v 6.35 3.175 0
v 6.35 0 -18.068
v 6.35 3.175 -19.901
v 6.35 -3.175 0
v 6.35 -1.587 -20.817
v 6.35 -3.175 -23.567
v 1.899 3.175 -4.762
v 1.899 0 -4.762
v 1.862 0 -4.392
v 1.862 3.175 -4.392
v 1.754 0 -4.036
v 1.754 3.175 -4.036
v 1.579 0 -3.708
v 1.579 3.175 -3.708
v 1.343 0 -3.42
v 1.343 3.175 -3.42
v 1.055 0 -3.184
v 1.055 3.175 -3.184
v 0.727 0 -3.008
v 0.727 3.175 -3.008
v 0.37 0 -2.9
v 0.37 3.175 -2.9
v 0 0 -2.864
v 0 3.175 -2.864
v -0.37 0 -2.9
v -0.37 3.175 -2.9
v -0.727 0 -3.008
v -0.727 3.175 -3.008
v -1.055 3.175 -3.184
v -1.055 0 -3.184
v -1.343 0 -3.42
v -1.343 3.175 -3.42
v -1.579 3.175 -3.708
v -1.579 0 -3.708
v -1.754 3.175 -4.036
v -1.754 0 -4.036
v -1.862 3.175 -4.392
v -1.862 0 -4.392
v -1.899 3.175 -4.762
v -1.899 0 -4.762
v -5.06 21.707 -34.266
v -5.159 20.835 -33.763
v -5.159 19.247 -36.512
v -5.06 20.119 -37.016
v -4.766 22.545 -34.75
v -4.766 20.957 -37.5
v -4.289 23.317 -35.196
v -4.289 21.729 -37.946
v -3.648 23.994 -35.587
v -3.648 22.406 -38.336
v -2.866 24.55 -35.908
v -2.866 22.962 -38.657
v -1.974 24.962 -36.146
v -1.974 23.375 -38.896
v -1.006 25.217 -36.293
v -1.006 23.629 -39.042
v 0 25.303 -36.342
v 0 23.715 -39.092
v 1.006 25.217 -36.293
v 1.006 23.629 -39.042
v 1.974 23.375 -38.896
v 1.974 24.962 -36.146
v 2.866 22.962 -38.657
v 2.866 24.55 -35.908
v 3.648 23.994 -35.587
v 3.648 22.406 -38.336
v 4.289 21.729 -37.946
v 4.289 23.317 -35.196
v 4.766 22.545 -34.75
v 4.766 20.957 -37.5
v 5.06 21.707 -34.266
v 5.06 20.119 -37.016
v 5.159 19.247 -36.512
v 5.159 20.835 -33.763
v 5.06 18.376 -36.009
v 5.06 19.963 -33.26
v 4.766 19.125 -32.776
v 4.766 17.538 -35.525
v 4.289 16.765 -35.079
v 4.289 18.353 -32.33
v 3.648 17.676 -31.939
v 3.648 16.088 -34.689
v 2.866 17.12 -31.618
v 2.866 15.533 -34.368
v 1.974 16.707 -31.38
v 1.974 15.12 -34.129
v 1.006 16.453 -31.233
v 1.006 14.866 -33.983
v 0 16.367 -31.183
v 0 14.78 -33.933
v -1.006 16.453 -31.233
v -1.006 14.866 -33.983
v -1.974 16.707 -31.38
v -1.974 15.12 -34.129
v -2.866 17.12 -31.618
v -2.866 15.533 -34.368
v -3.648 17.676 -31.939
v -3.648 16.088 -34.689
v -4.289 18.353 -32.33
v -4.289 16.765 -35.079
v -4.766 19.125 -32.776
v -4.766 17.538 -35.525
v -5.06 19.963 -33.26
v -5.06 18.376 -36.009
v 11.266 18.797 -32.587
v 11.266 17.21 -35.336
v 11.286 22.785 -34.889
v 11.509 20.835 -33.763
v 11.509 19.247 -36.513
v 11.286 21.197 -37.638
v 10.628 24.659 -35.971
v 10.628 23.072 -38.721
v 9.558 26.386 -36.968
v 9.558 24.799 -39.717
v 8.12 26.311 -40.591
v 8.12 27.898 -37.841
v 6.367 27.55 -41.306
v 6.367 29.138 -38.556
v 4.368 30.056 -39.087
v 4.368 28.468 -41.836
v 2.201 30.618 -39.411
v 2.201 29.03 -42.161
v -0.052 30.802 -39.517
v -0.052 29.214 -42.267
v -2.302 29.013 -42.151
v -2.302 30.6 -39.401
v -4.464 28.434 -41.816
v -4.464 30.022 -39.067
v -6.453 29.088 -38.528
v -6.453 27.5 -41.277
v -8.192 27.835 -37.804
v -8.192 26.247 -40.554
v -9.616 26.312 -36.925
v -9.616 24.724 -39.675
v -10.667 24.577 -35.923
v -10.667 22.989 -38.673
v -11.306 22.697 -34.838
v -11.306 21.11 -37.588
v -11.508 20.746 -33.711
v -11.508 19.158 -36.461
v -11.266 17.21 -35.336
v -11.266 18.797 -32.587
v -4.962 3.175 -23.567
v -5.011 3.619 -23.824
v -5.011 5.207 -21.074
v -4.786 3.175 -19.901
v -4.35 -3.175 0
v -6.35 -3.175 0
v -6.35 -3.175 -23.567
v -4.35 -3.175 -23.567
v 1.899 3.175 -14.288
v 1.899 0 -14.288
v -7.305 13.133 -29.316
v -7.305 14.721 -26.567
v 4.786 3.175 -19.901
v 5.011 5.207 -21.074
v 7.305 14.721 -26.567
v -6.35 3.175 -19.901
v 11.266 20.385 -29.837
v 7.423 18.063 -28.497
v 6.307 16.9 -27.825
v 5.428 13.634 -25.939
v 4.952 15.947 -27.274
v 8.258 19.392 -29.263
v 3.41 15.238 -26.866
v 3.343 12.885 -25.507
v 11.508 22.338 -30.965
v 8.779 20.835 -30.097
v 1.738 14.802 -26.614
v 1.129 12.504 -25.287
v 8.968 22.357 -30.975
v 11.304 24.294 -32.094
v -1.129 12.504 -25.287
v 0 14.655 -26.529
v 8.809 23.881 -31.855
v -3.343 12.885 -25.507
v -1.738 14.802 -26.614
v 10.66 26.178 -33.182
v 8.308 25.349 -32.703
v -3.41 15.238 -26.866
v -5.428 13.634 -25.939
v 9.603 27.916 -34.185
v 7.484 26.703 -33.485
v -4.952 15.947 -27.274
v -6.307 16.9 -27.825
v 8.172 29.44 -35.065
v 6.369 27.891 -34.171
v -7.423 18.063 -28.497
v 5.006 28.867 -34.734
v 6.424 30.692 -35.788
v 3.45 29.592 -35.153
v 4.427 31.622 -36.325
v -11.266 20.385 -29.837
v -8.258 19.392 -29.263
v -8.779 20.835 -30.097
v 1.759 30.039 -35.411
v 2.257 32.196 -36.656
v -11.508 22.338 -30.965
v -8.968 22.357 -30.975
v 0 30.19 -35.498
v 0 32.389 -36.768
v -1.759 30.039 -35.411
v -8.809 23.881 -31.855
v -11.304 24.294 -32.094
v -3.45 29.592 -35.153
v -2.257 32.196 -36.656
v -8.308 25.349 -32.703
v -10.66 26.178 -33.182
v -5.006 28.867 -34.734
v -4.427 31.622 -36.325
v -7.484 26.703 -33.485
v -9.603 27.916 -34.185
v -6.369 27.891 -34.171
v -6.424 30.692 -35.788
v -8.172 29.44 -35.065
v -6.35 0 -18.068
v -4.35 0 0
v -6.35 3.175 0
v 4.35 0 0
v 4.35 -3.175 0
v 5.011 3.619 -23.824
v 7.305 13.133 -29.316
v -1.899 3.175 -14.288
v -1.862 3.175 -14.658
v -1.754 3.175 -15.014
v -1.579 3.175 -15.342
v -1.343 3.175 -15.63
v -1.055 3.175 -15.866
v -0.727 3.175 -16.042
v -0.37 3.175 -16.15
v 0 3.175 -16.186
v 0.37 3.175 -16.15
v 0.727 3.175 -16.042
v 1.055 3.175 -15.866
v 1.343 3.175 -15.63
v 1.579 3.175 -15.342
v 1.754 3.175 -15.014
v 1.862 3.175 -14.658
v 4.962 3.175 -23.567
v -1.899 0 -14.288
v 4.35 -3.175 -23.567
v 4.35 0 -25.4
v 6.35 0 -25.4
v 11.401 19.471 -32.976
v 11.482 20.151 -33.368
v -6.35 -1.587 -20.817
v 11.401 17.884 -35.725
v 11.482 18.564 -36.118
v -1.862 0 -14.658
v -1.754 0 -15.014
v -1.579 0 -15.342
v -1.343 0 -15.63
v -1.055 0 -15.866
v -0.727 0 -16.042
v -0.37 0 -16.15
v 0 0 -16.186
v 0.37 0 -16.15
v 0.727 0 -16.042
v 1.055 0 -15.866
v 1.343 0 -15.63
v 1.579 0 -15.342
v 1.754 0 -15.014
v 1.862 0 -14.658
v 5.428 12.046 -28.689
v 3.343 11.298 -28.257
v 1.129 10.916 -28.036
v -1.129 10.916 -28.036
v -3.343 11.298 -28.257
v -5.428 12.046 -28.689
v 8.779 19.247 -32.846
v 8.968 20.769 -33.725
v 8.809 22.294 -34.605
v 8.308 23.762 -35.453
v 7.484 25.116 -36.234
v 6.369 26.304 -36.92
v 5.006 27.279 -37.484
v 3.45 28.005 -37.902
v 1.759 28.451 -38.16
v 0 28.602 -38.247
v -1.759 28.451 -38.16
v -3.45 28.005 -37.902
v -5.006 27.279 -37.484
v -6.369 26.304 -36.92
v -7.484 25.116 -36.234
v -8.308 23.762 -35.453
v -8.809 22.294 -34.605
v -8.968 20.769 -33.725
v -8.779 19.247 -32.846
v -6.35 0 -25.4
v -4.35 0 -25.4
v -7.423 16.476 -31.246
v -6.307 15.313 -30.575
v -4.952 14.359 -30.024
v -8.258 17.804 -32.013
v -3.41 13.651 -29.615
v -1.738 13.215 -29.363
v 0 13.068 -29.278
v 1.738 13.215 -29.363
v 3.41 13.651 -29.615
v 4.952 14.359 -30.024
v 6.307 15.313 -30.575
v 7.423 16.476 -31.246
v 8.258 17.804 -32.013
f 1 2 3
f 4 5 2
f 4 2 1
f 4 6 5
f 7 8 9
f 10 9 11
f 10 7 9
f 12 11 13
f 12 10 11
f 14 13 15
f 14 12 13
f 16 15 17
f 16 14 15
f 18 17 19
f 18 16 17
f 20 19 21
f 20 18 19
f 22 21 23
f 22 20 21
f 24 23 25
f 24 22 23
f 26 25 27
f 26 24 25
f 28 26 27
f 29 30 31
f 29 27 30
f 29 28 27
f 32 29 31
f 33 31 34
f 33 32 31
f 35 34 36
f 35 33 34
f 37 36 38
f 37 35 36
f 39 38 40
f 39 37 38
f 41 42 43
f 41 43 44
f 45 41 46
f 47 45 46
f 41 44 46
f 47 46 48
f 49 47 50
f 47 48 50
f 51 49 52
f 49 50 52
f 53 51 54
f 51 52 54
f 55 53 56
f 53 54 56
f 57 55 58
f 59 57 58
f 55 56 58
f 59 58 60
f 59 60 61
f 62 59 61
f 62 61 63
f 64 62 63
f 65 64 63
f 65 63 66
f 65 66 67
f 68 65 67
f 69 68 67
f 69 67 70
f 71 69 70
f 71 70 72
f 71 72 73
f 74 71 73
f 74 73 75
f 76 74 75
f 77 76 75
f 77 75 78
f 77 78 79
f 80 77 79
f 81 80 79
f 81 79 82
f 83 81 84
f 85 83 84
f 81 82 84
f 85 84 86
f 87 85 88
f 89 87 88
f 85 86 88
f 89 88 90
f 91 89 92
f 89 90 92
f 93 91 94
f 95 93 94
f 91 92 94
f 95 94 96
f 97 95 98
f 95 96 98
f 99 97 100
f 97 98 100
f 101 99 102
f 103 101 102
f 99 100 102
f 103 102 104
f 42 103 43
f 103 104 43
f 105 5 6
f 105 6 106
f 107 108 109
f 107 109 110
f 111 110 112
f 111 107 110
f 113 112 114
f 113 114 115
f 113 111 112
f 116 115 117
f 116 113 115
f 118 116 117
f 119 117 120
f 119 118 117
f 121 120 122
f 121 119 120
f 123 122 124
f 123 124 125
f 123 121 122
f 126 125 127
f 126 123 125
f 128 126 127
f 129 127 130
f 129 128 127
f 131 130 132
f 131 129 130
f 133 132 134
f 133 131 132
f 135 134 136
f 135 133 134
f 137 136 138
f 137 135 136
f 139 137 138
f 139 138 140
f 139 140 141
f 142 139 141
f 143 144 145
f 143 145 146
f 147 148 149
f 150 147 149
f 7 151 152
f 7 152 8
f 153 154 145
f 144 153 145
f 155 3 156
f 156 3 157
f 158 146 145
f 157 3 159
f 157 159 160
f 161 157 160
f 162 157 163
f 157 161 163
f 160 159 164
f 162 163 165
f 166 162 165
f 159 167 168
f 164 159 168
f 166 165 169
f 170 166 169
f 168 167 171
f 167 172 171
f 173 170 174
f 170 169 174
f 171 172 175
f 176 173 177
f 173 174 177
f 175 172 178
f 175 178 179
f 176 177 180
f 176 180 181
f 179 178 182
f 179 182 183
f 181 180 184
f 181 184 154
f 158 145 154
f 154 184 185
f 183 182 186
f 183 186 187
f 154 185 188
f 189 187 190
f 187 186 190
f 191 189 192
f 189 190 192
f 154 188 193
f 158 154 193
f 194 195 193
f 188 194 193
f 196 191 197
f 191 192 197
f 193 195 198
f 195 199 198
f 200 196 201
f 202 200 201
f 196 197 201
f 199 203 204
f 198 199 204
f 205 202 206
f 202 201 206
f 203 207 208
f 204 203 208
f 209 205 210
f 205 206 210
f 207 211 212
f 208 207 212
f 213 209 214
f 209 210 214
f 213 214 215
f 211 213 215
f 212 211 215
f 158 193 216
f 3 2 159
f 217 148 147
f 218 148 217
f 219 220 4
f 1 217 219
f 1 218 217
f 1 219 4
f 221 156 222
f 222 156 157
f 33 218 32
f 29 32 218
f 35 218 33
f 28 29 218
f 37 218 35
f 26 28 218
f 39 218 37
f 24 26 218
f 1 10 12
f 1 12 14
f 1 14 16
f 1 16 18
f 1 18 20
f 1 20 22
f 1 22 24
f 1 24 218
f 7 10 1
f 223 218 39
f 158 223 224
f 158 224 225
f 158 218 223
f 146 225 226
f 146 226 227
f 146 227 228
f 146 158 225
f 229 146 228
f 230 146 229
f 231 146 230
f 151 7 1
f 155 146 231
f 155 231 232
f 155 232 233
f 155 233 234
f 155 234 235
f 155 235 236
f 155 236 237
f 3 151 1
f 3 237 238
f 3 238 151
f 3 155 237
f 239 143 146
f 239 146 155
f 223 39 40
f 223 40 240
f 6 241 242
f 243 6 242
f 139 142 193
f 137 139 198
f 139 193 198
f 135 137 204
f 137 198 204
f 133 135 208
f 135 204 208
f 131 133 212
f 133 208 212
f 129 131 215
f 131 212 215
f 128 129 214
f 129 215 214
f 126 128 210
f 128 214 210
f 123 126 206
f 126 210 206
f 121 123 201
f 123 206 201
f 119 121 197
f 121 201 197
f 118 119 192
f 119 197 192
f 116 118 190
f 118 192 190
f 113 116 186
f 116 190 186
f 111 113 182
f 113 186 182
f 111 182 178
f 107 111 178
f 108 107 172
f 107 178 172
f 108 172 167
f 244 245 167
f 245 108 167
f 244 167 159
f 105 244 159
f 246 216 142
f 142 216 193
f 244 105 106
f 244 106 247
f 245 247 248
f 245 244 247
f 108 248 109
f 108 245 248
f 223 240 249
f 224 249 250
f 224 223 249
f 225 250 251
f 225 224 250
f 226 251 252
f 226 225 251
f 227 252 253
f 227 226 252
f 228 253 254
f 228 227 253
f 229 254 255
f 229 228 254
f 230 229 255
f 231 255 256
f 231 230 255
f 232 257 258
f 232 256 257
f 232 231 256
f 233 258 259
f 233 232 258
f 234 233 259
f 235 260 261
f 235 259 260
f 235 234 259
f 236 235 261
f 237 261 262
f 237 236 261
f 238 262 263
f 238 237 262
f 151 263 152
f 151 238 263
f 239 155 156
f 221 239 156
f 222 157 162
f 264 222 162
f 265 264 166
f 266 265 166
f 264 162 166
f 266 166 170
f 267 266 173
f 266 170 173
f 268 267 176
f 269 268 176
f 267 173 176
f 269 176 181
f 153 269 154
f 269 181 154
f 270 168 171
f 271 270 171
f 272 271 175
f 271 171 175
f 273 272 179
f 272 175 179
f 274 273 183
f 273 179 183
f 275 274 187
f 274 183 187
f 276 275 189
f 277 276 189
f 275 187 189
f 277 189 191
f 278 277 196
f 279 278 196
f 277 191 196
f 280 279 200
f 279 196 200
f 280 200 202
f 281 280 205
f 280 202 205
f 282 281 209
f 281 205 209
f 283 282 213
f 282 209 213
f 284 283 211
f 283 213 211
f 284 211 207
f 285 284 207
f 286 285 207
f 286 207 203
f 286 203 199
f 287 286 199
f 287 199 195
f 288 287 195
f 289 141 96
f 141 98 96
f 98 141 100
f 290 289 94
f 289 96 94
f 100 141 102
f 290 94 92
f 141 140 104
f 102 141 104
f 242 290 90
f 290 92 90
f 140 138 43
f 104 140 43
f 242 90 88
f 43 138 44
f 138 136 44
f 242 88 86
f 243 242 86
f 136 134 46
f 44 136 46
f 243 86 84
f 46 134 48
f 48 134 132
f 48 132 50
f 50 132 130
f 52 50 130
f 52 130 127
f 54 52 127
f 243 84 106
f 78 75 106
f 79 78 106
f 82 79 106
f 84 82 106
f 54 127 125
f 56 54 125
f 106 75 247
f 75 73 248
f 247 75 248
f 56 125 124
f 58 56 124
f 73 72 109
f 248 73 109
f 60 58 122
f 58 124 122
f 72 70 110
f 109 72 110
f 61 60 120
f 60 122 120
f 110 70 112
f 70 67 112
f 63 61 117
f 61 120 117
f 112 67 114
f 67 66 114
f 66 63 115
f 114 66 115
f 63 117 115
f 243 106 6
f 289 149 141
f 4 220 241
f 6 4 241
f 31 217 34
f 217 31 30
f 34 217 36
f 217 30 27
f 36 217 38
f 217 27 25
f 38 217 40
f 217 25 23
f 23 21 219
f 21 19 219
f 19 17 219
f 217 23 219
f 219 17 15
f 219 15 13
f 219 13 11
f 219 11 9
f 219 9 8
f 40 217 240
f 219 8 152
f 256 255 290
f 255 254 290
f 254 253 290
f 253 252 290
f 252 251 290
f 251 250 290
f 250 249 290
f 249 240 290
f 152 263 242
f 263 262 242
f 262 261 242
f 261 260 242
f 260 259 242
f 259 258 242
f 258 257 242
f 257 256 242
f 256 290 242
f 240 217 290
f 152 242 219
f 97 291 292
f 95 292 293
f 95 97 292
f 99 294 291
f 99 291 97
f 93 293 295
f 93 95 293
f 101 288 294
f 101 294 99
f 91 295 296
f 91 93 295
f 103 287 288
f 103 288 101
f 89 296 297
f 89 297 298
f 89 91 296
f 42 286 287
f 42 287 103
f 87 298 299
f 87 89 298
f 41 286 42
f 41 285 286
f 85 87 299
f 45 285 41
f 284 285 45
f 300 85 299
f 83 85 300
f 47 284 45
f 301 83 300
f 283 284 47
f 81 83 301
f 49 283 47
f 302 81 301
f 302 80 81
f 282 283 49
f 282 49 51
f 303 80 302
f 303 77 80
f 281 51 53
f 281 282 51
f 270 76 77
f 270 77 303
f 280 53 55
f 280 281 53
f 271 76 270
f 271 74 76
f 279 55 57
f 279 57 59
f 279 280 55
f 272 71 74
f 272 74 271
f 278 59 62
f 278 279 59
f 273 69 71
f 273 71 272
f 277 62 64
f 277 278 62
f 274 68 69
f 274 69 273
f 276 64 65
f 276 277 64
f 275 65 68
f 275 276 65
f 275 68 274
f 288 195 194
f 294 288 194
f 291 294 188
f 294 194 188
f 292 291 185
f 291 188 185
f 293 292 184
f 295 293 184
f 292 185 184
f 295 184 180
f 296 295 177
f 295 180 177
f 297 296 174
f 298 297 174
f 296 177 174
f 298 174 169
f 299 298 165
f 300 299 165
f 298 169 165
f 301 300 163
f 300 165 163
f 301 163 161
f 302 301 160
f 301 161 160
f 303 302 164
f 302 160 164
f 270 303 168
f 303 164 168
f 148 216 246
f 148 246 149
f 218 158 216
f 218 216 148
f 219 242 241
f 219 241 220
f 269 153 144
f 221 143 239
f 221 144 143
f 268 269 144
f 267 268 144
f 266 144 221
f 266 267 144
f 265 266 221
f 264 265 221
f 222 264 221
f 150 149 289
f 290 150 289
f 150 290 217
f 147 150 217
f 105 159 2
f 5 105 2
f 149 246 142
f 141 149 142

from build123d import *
from build123d.topology import SkipClean

# Parameters (mm, degrees)
SKETCH1_W               = 12.7
SKETCH1_H               = 25.4
BOSS_EXTRUDE1_DEPTH     = 3.175
SKETCH17_W              = 12.7
SKETCH17_H              = 3.175
BOSS_EXTRUDE5_DEPTH     = 31.75
F_3_8_CLEARANCE_HOLE1_D = 10.31748
BOSS_EXTRUDE6_DEPTH     = 3.175
CUT_EXTRUDE4_DEPTH      = 52.789749346
SKETCH31_W              = 2.00025
SKETCH31_H              = 25.4
BOSS_EXTRUDE9_DEPTH     = 18.034
CUT_EXTRUDE6_DEPTH      = 54.550805677
CUT_EXTRUDE6_DEPTH_BACK = 54.550805677
BOSS_EXTRUDE10_START    = -3.175
BOSS_EXTRUDE10_DEPTH    = 3.175
BOSS_EXTRUDE11_START    = 3.175
BOSS_EXTRUDE11_DEPTH    = 3.175


with BuildPart() as part:
    # Sketch1 → Boss-Extrude1 (new body)
    with BuildSketch(Plane(origin=(0, 0, 0), x_dir=(1, 0, 0), z_dir=(0, 1, 0))):
        with Locations((0, 12.7)):
            Rectangle(SKETCH1_W, SKETCH1_H)
    extrude(amount=BOSS_EXTRUDE1_DEPTH)

    # Sketch17 → Boss-Extrude5 (add)
    with BuildSketch(Plane(origin=(0, 10.998522628, -6.35), x_dir=(-1, 0, 0), z_dir=(0, 0.866025403784438, -0.500000000000001))):
        with Locations((0, -20.409545256)):
            Rectangle(SKETCH17_W, SKETCH17_H)
    extrude(amount=BOSS_EXTRUDE5_DEPTH)

    # 3/8 Clearance Hole1 (through all)
    with Locations(Plane(origin=(0, -9.411022628, -16.300369343), x_dir=(1, 0, 0), z_dir=(0, 0.5000000000000011, 0.8660254037844379))):
        with Locations((0, 34.925)):
            Hole(F_3_8_CLEARANCE_HOLE1_D / 2)

    # Sketch26 → Boss-Extrude6 (add)
    with BuildSketch(Plane(origin=(0, -9.411022628, -16.300369343), x_dir=(1, 0, 0), z_dir=(0, 0.5000000000000011, 0.8660254037844379))):
        with BuildLine():
            ThreePointArc((6.35, 25.326635744), (10.137346679, 29.47657833), (11.50874, 34.925))
            ThreePointArc((11.50874, 34.925), (-5.44842167, 45.062346679), (-6.35, 25.326635744))
            Line((-6.35, 25.326635744), (-6.35, 44.45))
            Line((-6.35, 44.45), (6.35, 44.45))
            Line((6.35, 44.45), (6.35, 25.326635744))
        make_face()
    extrude(amount=-BOSS_EXTRUDE6_DEPTH)

    # Sketch27 → Cut-Extrude4 (cut, through all)
    with BuildSketch(Plane(origin=(0, 3.175, 0), x_dir=(1, 0, 0), z_dir=(0, 1, 0))):
        with BuildLine():
            Line((1.89865, 14.2875), (1.89865, 4.7625))
            ThreePointArc((1.89865, 4.7625), (0, 2.86385), (-1.89865, 4.7625))
            Line((-1.89865, 4.7625), (-1.89865, 14.2875))
            ThreePointArc((-1.89865, 14.2875), (0, 16.18615), (1.89865, 14.2875))
        make_face()
    extrude(amount=-CUT_EXTRUDE4_DEPTH, mode=Mode.SUBTRACT)

    # Sketch31 → Boss-Extrude9 (add)
    with BuildSketch(Plane.XZ):
        with Locations((-5.349875, -12.7)):
            Rectangle(SKETCH31_W, SKETCH31_H)
        with Locations((5.349875, -12.7)):
            Rectangle(SKETCH31_W, SKETCH31_H)
    extrude(amount=BOSS_EXTRUDE9_DEPTH)

    # Sketch32 → Cut-Extrude6 (cut, two sides: drawn at the far end of the back side and taken through both)
    with BuildSketch(Plane(origin=(0, 0, 0), x_dir=(0, 0, -1), z_dir=(1, 0, 0)).offset(-CUT_EXTRUDE6_DEPTH_BACK)):
        Polygon((0, -3.175), (23.566912895, -3.175), (25.4, 0), (41.090286181, -22.96252164), (-8.953256295, -22.624237032), align=None)
    extrude(amount=CUT_EXTRUDE6_DEPTH + CUT_EXTRUDE6_DEPTH_BACK, mode=Mode.SUBTRACT)

    # Sketch35 → Boss-Extrude10 (add)
    with BuildSketch(Plane(origin=(0, -10.998522628, -19.05), x_dir=(-1, 0, 0), z_dir=(0, -0.5000000000000012, -0.866025403784438)).offset(BOSS_EXTRUDE10_START)):
        with BuildLine():
            Line((-6.35, 9.033825791), (-11.26569769, 32.572309637))
            ThreePointArc((-11.26569769, 32.572309637), (-9.523820075, 28.463734832), (-6.35, 25.326635744))
            Line((-6.35, 25.326635744), (-6.35, 9.033825791))
        make_face()
        with BuildLine():
            Line((6.35, 9.033825791), (11.26569769, 32.572309637))
            ThreePointArc((11.26569769, 32.572309637), (9.523820075, 28.463734832), (6.35, 25.326635744))
            Line((6.35, 25.326635744), (6.35, 9.033825791))
        make_face()
    extrude(amount=BOSS_EXTRUDE10_DEPTH)

    # Sketch36 → Boss-Extrude11 (add)
    with SkipClean():  # the faces are left unmerged after this step: merging them gives an invalid solid
        with BuildSketch(Plane(origin=(0, -9.411022628, -16.300369343), x_dir=(1, 0, 0), z_dir=(0, 0.500000000000001, 0.8660254037844382)).offset(BOSS_EXTRUDE11_START)):
            with BuildLine():
                Line((-5.010829857, 15.04630998), (-4.471472861, 9.426131072))
                Line((-4.471472861, 9.426131072), (-6.35, 9.033825791))
                Line((-6.35, 9.033825791), (-11.26569769, 32.572309637))
                ThreePointArc((-11.26569769, 32.572309637), (0, 46.43374), (11.26569769, 32.572309637))
                Line((11.26569769, 32.572309637), (6.35, 9.033825791))
                Line((6.35, 9.033825791), (4.471472861, 9.426131072))
                Line((4.471472861, 9.426131072), (5.010829857, 15.04630998))
                Line((5.010829857, 15.04630998), (7.30501638, 26.031866015))
                ThreePointArc((7.30501638, 26.031866015), (0, 23.41626), (-7.30501638, 26.031866015))
                Line((-7.30501638, 26.031866015), (-5.010829857, 15.04630998))
            make_face()
            with BuildLine():
                ThreePointArc((-8.779337573, 33.09155271), (0, 25.95626), (8.779337573, 33.09155271))
                ThreePointArc((8.779337573, 33.09155271), (0, 43.89374), (-8.779337573, 33.09155271))
            make_face(mode=Mode.SUBTRACT)
        extrude(amount=-BOSS_EXTRUDE11_DEPTH)


solid = part.part
